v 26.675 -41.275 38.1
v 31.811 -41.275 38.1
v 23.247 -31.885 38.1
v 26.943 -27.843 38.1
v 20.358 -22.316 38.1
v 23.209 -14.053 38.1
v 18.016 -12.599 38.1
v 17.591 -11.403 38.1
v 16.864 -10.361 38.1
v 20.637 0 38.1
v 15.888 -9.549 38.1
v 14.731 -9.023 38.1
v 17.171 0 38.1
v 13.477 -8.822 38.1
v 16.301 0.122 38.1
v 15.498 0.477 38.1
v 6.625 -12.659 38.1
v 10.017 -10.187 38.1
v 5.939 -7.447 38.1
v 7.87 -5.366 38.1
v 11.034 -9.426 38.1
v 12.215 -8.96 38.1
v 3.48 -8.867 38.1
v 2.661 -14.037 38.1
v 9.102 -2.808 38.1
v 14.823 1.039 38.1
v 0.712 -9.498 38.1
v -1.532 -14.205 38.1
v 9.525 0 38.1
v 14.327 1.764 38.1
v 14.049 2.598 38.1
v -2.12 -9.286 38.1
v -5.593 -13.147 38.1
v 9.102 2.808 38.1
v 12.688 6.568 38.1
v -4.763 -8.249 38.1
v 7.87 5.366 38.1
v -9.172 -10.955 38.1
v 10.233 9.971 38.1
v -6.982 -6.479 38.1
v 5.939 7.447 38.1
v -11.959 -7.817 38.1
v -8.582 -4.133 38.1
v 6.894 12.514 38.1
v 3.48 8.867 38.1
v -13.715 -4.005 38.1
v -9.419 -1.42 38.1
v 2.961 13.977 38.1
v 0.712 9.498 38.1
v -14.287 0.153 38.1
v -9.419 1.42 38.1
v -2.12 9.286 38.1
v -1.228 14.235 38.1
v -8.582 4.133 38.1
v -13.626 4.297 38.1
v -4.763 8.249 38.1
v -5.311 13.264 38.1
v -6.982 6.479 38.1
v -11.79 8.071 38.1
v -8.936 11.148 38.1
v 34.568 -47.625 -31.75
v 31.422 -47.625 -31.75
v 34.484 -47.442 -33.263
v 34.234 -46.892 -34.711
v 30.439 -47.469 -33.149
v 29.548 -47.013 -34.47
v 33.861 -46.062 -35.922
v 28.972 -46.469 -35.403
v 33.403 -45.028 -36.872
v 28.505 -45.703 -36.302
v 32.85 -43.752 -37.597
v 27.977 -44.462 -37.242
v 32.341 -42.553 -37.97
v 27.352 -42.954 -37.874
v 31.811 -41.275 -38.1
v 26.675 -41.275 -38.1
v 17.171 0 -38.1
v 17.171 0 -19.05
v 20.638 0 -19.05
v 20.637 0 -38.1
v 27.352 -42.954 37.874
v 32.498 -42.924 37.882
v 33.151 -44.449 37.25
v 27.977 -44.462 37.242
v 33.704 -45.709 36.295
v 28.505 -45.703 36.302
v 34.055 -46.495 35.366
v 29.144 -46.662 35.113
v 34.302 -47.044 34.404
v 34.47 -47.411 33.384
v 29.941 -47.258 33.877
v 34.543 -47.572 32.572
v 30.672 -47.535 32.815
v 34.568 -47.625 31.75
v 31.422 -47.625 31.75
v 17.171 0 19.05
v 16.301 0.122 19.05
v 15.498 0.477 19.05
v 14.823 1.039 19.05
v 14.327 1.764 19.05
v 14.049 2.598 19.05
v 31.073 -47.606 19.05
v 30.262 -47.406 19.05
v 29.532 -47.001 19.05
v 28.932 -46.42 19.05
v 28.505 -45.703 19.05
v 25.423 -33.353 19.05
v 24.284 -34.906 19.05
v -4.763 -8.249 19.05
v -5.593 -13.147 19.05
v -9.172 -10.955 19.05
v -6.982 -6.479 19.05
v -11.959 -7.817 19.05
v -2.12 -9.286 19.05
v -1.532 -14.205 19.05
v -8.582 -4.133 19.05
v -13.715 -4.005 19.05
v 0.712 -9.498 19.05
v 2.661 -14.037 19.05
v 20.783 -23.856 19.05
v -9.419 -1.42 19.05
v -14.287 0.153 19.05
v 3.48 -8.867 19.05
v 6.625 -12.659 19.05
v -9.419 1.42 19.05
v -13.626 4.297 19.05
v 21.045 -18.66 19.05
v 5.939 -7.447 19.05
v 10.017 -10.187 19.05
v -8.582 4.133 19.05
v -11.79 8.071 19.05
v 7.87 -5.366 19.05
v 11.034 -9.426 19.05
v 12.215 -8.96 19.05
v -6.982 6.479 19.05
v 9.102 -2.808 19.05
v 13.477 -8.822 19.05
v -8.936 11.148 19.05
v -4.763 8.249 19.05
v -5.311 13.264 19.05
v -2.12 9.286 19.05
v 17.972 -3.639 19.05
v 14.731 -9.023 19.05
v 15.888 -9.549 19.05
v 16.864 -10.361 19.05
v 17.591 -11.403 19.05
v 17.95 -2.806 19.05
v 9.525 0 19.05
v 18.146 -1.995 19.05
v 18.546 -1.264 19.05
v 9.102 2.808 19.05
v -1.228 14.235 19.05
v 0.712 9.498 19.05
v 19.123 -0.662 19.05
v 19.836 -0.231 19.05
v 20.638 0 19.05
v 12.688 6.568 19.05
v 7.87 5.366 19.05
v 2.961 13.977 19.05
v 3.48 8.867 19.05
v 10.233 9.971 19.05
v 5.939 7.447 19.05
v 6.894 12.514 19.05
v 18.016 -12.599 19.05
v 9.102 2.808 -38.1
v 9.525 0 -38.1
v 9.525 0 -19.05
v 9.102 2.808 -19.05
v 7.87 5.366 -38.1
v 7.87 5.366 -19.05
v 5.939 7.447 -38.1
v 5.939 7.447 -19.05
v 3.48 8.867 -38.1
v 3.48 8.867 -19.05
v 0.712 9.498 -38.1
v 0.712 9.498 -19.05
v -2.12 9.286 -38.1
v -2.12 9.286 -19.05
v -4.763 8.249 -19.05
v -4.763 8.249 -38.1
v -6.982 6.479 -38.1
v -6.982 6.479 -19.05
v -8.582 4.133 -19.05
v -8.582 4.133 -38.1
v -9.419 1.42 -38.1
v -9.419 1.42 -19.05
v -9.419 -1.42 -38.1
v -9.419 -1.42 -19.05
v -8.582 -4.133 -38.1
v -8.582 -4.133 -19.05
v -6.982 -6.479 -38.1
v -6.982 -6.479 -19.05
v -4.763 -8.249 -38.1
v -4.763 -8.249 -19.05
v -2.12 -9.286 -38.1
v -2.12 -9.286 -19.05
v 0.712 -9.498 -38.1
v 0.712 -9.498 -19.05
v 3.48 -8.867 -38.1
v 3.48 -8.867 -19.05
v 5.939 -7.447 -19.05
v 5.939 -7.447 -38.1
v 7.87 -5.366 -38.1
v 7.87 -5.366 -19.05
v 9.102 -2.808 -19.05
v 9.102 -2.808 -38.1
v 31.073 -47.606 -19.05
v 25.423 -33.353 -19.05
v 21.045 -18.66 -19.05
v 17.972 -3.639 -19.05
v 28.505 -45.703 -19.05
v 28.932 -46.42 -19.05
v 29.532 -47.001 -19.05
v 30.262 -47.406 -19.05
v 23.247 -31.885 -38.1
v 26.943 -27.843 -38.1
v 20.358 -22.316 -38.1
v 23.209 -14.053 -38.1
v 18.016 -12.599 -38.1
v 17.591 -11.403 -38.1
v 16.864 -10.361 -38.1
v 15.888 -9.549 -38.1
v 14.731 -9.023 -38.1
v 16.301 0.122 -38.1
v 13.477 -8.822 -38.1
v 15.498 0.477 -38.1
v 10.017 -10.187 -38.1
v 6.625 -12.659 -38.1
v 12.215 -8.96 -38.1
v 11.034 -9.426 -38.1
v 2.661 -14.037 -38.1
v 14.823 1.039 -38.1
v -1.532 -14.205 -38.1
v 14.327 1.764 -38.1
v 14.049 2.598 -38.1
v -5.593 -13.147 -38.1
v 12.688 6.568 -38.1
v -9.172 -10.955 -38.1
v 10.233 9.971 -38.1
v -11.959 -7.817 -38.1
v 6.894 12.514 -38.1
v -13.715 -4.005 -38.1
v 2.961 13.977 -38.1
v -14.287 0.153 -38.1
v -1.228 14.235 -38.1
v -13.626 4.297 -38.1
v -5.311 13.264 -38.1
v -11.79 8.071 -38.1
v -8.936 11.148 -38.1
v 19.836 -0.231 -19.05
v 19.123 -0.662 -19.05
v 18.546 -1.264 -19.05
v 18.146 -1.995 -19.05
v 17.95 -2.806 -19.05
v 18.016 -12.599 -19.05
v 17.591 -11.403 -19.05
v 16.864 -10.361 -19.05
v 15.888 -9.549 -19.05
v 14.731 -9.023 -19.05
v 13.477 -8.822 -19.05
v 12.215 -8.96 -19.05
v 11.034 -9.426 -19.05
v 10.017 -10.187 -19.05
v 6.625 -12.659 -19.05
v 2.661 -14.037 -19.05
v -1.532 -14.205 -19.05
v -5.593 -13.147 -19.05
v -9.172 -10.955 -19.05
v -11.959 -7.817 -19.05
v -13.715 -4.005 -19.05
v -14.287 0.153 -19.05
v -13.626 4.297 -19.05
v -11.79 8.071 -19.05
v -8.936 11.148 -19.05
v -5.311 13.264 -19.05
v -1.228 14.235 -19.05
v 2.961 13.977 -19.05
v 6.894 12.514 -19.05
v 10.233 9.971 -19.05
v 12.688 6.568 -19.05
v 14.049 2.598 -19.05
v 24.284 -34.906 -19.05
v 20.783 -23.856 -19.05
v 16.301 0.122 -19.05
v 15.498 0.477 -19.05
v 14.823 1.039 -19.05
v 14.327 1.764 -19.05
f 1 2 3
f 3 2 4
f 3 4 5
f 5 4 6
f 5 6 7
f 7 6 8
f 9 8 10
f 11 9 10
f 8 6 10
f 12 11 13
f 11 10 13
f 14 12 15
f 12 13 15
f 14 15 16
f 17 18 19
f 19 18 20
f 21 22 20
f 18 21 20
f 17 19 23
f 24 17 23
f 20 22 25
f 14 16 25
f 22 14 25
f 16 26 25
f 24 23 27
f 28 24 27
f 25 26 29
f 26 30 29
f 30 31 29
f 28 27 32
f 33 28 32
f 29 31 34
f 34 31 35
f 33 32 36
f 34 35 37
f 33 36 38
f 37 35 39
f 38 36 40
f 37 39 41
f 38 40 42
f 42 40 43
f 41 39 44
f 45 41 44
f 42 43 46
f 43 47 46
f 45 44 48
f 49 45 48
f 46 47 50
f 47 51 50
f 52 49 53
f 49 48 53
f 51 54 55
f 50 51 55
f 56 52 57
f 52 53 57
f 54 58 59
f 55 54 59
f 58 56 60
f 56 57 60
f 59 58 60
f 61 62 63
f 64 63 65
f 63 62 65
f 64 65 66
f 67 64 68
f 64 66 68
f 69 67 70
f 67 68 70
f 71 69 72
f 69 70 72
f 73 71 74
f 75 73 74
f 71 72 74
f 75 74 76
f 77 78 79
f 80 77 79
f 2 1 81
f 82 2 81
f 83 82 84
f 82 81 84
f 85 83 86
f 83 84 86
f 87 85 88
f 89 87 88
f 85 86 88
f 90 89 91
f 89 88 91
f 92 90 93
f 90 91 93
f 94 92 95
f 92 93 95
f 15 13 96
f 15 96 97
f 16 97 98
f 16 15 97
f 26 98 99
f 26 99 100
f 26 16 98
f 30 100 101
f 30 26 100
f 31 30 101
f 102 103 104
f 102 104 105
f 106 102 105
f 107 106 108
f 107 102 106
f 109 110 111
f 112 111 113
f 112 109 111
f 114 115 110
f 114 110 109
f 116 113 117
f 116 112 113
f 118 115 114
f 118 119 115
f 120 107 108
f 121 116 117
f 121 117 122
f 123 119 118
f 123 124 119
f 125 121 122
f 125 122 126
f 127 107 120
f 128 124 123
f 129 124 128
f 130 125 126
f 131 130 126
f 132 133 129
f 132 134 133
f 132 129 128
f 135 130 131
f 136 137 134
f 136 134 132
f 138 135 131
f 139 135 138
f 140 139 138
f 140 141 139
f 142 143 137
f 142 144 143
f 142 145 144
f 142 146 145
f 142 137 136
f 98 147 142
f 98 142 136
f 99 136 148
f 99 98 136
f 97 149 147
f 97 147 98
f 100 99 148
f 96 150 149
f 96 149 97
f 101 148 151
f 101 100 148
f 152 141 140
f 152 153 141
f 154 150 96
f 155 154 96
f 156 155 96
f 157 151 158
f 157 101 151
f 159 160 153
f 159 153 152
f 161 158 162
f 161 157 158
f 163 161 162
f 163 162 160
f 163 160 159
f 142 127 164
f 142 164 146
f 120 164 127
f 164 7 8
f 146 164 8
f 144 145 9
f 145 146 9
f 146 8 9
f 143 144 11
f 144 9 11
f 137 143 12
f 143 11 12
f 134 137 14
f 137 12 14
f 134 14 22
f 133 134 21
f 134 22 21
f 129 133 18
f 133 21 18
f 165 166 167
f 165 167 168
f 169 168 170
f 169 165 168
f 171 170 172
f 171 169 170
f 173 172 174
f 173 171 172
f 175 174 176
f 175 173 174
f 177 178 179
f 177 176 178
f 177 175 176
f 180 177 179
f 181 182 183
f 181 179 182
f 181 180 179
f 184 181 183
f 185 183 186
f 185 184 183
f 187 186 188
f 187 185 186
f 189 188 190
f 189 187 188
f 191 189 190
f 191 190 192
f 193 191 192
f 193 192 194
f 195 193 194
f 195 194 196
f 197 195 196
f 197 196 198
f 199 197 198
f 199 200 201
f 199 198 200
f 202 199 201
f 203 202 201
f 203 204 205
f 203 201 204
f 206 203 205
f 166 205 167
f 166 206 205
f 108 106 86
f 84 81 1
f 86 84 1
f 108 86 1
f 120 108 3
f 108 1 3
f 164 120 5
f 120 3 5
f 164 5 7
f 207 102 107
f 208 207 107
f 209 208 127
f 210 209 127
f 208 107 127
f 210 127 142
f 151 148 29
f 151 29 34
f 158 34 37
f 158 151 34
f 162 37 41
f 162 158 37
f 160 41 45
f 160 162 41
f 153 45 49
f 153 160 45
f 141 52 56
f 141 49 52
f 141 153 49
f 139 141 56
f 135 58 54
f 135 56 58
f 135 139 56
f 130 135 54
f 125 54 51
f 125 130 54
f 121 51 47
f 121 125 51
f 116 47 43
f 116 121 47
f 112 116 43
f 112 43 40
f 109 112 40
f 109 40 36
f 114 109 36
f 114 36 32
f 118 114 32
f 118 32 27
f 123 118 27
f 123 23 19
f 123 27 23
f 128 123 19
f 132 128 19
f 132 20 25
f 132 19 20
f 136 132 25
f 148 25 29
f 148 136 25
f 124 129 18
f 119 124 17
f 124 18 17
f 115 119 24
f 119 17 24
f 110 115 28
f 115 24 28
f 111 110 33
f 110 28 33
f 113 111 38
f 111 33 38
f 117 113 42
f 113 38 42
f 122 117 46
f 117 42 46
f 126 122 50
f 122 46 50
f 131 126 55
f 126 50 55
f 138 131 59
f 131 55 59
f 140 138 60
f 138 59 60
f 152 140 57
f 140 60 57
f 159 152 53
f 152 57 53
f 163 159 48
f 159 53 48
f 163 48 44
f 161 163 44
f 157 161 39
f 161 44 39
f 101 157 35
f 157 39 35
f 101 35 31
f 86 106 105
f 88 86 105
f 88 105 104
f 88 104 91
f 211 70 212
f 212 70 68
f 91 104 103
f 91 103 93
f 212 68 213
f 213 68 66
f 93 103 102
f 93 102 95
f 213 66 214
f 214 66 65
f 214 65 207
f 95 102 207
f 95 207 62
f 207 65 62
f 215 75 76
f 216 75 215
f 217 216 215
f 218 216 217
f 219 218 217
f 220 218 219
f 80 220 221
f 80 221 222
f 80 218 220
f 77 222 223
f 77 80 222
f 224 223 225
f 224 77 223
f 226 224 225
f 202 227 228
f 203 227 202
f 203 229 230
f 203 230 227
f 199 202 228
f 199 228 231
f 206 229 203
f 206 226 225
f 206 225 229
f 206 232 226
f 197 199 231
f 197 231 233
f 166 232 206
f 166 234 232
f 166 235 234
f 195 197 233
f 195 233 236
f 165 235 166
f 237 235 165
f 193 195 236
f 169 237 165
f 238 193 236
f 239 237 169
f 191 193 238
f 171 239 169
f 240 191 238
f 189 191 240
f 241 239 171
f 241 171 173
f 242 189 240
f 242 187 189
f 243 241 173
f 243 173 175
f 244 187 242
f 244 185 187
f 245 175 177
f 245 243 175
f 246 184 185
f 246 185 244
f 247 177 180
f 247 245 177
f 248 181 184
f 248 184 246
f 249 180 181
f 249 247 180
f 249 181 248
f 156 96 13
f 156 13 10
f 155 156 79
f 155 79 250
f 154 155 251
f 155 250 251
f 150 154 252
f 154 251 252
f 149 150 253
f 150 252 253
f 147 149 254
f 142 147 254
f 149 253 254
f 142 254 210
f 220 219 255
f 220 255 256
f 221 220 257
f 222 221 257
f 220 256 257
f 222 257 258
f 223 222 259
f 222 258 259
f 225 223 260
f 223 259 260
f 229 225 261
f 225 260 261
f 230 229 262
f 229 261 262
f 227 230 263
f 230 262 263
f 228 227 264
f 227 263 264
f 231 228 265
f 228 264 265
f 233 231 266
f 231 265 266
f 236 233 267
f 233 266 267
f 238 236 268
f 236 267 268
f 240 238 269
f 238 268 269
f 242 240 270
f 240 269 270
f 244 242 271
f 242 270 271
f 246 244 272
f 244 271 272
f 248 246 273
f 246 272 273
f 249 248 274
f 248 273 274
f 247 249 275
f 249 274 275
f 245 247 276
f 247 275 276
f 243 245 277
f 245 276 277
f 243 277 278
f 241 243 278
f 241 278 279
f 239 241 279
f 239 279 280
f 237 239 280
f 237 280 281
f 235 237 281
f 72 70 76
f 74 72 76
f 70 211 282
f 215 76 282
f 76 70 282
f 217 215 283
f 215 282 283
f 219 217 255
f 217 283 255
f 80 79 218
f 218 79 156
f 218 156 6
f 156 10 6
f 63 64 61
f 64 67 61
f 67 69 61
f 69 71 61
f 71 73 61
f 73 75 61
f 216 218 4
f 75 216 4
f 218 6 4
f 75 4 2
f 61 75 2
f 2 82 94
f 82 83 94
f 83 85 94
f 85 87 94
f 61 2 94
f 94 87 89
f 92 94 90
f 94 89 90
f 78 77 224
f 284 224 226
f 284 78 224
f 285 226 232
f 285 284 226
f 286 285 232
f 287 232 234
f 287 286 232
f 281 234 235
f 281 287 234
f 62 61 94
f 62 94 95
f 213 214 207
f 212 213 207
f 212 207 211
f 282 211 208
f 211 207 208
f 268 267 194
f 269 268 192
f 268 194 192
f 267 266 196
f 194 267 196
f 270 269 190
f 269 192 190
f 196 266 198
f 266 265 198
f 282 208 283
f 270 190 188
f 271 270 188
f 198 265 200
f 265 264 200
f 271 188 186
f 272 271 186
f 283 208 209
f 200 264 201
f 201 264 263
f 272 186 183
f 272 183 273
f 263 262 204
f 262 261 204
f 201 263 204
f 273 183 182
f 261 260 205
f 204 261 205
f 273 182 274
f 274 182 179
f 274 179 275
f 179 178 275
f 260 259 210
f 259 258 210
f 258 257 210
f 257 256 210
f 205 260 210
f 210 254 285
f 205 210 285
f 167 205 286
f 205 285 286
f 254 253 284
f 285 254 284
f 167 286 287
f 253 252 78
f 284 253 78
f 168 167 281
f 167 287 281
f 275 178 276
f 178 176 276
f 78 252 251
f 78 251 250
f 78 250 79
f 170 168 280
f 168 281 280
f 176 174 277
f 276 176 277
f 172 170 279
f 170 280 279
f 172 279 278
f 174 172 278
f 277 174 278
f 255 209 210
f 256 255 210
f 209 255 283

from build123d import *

# Parameters (mm, degrees)
BOSS_EXTRUDE1_DEPTH     = 38.1
FILLET1_R               = 3.175
FILLET2_R               = 6.35
FILLET3_R               = 6.35
FILLET4_R               = 3.175
CUT_EXTRUDE2_DEPTH      = 97.278232488
CUT_EXTRUDE2_DEPTH_BACK = 97.278232488
SKETCH4_R               = 9.525
CUT_EXTRUDE4_DEPTH      = 19.05
FILLET5_R               = 3.175


with BuildPart() as part:
    # Sketch1 → Boss-Extrude1 (new, symmetric)
    with BuildSketch(Plane.XY):
        with BuildLine():
            Line((14.2875, 0), (20.6375, 0))
            ThreePointArc((20.6375, 0), (25.87049136, -24.319115263), (34.567577214, -47.625))
            Line((34.567577214, -47.625), (29.343435198, -47.625))
            ThreePointArc((29.343435198, -47.625), (22.762716722, -30.40866876), (18.016295413, -12.599137554))
            ThreePointArc((18.016295413, -12.599137554), (14.73137517, -9.023483479), (10.017434273, -10.187426899))
            ThreePointArc((10.017434273, -10.187426899), (-13.17681199, 5.523068172), (14.2875, 0))
        make_face()
    extrude(amount=BOSS_EXTRUDE1_DEPTH, both=True)

    # Fillet1
    fillet1_edges = [part.edges().sort_by_distance(p)[0] for p in [
        (14.2875, 0, 0),
    ]]
    fillet(fillet1_edges, radius=FILLET1_R)

    # Fillet2
    fillet2_edges = [part.edges().sort_by_distance(p)[0] for p in [
        (31.955506206, -47.625, 38.1),
    ]]
    fillet(fillet2_edges, radius=FILLET2_R)

    # Fillet3
    fillet3_edges = [part.edges().sort_by_distance(p)[0] for p in [
        (31.955506206, -47.625, -38.1),
    ]]
    fillet(fillet3_edges, radius=FILLET3_R)

    # Fillet4
    # the kernel refuses this fillet: 3.175 mm, written as the material it takes off along each edge
    with BuildSketch(Plane(origin=(29.343435198, -47.625, -36.993879976), x_dir=(-0.3999574931440754, 0.9165336893305706, 0), z_dir=(0, 0, 1))) as fillet4_piece_1:
        with BuildLine():
            CenterArc((2.078655126, -3.174943765), FILLET4_R, 89.658986775, 66.765492029)
            Line((-0.831339338, -1.905078724), (0, 0))
            ThreePointArc((0, 0), (1.048775995, 0.003121064), (2.09755199, 0))
        make_face()
    extrude(amount=73.987759951, mode=Mode.SUBTRACT)

    # Sketch4 → Cut-Extrude2 (cut, two sides: drawn at the far end of the back side and taken through both)
    with BuildSketch(Plane.XY.offset(38.1).offset(-CUT_EXTRUDE2_DEPTH_BACK)):
        Circle(SKETCH4_R)
    extrude(amount=CUT_EXTRUDE2_DEPTH + CUT_EXTRUDE2_DEPTH_BACK, mode=Mode.SUBTRACT)

    # Sketch6 → Cut-Extrude4 (cut, symmetric)
    with BuildSketch(Plane.XY):
        with BuildLine():
            Line((29.343435198, -47.625), (31.081601096, -47.625))
            ThreePointArc((31.081601096, -47.625), (22.620737822, -24.512971667), (17.493272193, -0.440972222))
            Line((17.493272193, -0.440972222), (20.6375, 0))
            Line((20.6375, 0), (17.171437949, 0))
            ThreePointArc((17.171437949, 0), (15.140701126, 0.734358086), (14.049358322, 2.597727273))
            ThreePointArc((14.049358322, 2.597727273), (-13.625992377, 4.297090643), (10.017434273, -10.187426899))
            ThreePointArc((10.017434273, -10.187426899), (14.73137517, -9.023483479), (18.016295413, -12.599137554))
            ThreePointArc((18.016295413, -12.599137554), (22.762716722, -30.40866876), (29.343435198, -47.625))
        make_face()
    extrude(amount=CUT_EXTRUDE4_DEPTH, both=True, mode=Mode.SUBTRACT)

    # Fillet5
    # the kernel refuses this fillet: 3.175 mm, written as the material it takes off along each edge
    with BuildSketch(Plane(origin=(17.493272193, -0.440972222, -19.05), x_dir=(0.14805284588297285, -0.9889794511646602, 0), z_dir=(0, 0, 1))) as fillet5_piece_1:
        with BuildLine():
            CenterArc((3.204535532, 3.174863883), FILLET5_R, 179.469453196, 91.061093608)
            Line((0.029671649, 3.204263291), (0, 0))
            ThreePointArc((0, 0), (1.61696747, -0.007486442), (3.23393494, 0))
        make_face()
    extrude(amount=38.1, mode=Mode.SUBTRACT)


solid = part.part
